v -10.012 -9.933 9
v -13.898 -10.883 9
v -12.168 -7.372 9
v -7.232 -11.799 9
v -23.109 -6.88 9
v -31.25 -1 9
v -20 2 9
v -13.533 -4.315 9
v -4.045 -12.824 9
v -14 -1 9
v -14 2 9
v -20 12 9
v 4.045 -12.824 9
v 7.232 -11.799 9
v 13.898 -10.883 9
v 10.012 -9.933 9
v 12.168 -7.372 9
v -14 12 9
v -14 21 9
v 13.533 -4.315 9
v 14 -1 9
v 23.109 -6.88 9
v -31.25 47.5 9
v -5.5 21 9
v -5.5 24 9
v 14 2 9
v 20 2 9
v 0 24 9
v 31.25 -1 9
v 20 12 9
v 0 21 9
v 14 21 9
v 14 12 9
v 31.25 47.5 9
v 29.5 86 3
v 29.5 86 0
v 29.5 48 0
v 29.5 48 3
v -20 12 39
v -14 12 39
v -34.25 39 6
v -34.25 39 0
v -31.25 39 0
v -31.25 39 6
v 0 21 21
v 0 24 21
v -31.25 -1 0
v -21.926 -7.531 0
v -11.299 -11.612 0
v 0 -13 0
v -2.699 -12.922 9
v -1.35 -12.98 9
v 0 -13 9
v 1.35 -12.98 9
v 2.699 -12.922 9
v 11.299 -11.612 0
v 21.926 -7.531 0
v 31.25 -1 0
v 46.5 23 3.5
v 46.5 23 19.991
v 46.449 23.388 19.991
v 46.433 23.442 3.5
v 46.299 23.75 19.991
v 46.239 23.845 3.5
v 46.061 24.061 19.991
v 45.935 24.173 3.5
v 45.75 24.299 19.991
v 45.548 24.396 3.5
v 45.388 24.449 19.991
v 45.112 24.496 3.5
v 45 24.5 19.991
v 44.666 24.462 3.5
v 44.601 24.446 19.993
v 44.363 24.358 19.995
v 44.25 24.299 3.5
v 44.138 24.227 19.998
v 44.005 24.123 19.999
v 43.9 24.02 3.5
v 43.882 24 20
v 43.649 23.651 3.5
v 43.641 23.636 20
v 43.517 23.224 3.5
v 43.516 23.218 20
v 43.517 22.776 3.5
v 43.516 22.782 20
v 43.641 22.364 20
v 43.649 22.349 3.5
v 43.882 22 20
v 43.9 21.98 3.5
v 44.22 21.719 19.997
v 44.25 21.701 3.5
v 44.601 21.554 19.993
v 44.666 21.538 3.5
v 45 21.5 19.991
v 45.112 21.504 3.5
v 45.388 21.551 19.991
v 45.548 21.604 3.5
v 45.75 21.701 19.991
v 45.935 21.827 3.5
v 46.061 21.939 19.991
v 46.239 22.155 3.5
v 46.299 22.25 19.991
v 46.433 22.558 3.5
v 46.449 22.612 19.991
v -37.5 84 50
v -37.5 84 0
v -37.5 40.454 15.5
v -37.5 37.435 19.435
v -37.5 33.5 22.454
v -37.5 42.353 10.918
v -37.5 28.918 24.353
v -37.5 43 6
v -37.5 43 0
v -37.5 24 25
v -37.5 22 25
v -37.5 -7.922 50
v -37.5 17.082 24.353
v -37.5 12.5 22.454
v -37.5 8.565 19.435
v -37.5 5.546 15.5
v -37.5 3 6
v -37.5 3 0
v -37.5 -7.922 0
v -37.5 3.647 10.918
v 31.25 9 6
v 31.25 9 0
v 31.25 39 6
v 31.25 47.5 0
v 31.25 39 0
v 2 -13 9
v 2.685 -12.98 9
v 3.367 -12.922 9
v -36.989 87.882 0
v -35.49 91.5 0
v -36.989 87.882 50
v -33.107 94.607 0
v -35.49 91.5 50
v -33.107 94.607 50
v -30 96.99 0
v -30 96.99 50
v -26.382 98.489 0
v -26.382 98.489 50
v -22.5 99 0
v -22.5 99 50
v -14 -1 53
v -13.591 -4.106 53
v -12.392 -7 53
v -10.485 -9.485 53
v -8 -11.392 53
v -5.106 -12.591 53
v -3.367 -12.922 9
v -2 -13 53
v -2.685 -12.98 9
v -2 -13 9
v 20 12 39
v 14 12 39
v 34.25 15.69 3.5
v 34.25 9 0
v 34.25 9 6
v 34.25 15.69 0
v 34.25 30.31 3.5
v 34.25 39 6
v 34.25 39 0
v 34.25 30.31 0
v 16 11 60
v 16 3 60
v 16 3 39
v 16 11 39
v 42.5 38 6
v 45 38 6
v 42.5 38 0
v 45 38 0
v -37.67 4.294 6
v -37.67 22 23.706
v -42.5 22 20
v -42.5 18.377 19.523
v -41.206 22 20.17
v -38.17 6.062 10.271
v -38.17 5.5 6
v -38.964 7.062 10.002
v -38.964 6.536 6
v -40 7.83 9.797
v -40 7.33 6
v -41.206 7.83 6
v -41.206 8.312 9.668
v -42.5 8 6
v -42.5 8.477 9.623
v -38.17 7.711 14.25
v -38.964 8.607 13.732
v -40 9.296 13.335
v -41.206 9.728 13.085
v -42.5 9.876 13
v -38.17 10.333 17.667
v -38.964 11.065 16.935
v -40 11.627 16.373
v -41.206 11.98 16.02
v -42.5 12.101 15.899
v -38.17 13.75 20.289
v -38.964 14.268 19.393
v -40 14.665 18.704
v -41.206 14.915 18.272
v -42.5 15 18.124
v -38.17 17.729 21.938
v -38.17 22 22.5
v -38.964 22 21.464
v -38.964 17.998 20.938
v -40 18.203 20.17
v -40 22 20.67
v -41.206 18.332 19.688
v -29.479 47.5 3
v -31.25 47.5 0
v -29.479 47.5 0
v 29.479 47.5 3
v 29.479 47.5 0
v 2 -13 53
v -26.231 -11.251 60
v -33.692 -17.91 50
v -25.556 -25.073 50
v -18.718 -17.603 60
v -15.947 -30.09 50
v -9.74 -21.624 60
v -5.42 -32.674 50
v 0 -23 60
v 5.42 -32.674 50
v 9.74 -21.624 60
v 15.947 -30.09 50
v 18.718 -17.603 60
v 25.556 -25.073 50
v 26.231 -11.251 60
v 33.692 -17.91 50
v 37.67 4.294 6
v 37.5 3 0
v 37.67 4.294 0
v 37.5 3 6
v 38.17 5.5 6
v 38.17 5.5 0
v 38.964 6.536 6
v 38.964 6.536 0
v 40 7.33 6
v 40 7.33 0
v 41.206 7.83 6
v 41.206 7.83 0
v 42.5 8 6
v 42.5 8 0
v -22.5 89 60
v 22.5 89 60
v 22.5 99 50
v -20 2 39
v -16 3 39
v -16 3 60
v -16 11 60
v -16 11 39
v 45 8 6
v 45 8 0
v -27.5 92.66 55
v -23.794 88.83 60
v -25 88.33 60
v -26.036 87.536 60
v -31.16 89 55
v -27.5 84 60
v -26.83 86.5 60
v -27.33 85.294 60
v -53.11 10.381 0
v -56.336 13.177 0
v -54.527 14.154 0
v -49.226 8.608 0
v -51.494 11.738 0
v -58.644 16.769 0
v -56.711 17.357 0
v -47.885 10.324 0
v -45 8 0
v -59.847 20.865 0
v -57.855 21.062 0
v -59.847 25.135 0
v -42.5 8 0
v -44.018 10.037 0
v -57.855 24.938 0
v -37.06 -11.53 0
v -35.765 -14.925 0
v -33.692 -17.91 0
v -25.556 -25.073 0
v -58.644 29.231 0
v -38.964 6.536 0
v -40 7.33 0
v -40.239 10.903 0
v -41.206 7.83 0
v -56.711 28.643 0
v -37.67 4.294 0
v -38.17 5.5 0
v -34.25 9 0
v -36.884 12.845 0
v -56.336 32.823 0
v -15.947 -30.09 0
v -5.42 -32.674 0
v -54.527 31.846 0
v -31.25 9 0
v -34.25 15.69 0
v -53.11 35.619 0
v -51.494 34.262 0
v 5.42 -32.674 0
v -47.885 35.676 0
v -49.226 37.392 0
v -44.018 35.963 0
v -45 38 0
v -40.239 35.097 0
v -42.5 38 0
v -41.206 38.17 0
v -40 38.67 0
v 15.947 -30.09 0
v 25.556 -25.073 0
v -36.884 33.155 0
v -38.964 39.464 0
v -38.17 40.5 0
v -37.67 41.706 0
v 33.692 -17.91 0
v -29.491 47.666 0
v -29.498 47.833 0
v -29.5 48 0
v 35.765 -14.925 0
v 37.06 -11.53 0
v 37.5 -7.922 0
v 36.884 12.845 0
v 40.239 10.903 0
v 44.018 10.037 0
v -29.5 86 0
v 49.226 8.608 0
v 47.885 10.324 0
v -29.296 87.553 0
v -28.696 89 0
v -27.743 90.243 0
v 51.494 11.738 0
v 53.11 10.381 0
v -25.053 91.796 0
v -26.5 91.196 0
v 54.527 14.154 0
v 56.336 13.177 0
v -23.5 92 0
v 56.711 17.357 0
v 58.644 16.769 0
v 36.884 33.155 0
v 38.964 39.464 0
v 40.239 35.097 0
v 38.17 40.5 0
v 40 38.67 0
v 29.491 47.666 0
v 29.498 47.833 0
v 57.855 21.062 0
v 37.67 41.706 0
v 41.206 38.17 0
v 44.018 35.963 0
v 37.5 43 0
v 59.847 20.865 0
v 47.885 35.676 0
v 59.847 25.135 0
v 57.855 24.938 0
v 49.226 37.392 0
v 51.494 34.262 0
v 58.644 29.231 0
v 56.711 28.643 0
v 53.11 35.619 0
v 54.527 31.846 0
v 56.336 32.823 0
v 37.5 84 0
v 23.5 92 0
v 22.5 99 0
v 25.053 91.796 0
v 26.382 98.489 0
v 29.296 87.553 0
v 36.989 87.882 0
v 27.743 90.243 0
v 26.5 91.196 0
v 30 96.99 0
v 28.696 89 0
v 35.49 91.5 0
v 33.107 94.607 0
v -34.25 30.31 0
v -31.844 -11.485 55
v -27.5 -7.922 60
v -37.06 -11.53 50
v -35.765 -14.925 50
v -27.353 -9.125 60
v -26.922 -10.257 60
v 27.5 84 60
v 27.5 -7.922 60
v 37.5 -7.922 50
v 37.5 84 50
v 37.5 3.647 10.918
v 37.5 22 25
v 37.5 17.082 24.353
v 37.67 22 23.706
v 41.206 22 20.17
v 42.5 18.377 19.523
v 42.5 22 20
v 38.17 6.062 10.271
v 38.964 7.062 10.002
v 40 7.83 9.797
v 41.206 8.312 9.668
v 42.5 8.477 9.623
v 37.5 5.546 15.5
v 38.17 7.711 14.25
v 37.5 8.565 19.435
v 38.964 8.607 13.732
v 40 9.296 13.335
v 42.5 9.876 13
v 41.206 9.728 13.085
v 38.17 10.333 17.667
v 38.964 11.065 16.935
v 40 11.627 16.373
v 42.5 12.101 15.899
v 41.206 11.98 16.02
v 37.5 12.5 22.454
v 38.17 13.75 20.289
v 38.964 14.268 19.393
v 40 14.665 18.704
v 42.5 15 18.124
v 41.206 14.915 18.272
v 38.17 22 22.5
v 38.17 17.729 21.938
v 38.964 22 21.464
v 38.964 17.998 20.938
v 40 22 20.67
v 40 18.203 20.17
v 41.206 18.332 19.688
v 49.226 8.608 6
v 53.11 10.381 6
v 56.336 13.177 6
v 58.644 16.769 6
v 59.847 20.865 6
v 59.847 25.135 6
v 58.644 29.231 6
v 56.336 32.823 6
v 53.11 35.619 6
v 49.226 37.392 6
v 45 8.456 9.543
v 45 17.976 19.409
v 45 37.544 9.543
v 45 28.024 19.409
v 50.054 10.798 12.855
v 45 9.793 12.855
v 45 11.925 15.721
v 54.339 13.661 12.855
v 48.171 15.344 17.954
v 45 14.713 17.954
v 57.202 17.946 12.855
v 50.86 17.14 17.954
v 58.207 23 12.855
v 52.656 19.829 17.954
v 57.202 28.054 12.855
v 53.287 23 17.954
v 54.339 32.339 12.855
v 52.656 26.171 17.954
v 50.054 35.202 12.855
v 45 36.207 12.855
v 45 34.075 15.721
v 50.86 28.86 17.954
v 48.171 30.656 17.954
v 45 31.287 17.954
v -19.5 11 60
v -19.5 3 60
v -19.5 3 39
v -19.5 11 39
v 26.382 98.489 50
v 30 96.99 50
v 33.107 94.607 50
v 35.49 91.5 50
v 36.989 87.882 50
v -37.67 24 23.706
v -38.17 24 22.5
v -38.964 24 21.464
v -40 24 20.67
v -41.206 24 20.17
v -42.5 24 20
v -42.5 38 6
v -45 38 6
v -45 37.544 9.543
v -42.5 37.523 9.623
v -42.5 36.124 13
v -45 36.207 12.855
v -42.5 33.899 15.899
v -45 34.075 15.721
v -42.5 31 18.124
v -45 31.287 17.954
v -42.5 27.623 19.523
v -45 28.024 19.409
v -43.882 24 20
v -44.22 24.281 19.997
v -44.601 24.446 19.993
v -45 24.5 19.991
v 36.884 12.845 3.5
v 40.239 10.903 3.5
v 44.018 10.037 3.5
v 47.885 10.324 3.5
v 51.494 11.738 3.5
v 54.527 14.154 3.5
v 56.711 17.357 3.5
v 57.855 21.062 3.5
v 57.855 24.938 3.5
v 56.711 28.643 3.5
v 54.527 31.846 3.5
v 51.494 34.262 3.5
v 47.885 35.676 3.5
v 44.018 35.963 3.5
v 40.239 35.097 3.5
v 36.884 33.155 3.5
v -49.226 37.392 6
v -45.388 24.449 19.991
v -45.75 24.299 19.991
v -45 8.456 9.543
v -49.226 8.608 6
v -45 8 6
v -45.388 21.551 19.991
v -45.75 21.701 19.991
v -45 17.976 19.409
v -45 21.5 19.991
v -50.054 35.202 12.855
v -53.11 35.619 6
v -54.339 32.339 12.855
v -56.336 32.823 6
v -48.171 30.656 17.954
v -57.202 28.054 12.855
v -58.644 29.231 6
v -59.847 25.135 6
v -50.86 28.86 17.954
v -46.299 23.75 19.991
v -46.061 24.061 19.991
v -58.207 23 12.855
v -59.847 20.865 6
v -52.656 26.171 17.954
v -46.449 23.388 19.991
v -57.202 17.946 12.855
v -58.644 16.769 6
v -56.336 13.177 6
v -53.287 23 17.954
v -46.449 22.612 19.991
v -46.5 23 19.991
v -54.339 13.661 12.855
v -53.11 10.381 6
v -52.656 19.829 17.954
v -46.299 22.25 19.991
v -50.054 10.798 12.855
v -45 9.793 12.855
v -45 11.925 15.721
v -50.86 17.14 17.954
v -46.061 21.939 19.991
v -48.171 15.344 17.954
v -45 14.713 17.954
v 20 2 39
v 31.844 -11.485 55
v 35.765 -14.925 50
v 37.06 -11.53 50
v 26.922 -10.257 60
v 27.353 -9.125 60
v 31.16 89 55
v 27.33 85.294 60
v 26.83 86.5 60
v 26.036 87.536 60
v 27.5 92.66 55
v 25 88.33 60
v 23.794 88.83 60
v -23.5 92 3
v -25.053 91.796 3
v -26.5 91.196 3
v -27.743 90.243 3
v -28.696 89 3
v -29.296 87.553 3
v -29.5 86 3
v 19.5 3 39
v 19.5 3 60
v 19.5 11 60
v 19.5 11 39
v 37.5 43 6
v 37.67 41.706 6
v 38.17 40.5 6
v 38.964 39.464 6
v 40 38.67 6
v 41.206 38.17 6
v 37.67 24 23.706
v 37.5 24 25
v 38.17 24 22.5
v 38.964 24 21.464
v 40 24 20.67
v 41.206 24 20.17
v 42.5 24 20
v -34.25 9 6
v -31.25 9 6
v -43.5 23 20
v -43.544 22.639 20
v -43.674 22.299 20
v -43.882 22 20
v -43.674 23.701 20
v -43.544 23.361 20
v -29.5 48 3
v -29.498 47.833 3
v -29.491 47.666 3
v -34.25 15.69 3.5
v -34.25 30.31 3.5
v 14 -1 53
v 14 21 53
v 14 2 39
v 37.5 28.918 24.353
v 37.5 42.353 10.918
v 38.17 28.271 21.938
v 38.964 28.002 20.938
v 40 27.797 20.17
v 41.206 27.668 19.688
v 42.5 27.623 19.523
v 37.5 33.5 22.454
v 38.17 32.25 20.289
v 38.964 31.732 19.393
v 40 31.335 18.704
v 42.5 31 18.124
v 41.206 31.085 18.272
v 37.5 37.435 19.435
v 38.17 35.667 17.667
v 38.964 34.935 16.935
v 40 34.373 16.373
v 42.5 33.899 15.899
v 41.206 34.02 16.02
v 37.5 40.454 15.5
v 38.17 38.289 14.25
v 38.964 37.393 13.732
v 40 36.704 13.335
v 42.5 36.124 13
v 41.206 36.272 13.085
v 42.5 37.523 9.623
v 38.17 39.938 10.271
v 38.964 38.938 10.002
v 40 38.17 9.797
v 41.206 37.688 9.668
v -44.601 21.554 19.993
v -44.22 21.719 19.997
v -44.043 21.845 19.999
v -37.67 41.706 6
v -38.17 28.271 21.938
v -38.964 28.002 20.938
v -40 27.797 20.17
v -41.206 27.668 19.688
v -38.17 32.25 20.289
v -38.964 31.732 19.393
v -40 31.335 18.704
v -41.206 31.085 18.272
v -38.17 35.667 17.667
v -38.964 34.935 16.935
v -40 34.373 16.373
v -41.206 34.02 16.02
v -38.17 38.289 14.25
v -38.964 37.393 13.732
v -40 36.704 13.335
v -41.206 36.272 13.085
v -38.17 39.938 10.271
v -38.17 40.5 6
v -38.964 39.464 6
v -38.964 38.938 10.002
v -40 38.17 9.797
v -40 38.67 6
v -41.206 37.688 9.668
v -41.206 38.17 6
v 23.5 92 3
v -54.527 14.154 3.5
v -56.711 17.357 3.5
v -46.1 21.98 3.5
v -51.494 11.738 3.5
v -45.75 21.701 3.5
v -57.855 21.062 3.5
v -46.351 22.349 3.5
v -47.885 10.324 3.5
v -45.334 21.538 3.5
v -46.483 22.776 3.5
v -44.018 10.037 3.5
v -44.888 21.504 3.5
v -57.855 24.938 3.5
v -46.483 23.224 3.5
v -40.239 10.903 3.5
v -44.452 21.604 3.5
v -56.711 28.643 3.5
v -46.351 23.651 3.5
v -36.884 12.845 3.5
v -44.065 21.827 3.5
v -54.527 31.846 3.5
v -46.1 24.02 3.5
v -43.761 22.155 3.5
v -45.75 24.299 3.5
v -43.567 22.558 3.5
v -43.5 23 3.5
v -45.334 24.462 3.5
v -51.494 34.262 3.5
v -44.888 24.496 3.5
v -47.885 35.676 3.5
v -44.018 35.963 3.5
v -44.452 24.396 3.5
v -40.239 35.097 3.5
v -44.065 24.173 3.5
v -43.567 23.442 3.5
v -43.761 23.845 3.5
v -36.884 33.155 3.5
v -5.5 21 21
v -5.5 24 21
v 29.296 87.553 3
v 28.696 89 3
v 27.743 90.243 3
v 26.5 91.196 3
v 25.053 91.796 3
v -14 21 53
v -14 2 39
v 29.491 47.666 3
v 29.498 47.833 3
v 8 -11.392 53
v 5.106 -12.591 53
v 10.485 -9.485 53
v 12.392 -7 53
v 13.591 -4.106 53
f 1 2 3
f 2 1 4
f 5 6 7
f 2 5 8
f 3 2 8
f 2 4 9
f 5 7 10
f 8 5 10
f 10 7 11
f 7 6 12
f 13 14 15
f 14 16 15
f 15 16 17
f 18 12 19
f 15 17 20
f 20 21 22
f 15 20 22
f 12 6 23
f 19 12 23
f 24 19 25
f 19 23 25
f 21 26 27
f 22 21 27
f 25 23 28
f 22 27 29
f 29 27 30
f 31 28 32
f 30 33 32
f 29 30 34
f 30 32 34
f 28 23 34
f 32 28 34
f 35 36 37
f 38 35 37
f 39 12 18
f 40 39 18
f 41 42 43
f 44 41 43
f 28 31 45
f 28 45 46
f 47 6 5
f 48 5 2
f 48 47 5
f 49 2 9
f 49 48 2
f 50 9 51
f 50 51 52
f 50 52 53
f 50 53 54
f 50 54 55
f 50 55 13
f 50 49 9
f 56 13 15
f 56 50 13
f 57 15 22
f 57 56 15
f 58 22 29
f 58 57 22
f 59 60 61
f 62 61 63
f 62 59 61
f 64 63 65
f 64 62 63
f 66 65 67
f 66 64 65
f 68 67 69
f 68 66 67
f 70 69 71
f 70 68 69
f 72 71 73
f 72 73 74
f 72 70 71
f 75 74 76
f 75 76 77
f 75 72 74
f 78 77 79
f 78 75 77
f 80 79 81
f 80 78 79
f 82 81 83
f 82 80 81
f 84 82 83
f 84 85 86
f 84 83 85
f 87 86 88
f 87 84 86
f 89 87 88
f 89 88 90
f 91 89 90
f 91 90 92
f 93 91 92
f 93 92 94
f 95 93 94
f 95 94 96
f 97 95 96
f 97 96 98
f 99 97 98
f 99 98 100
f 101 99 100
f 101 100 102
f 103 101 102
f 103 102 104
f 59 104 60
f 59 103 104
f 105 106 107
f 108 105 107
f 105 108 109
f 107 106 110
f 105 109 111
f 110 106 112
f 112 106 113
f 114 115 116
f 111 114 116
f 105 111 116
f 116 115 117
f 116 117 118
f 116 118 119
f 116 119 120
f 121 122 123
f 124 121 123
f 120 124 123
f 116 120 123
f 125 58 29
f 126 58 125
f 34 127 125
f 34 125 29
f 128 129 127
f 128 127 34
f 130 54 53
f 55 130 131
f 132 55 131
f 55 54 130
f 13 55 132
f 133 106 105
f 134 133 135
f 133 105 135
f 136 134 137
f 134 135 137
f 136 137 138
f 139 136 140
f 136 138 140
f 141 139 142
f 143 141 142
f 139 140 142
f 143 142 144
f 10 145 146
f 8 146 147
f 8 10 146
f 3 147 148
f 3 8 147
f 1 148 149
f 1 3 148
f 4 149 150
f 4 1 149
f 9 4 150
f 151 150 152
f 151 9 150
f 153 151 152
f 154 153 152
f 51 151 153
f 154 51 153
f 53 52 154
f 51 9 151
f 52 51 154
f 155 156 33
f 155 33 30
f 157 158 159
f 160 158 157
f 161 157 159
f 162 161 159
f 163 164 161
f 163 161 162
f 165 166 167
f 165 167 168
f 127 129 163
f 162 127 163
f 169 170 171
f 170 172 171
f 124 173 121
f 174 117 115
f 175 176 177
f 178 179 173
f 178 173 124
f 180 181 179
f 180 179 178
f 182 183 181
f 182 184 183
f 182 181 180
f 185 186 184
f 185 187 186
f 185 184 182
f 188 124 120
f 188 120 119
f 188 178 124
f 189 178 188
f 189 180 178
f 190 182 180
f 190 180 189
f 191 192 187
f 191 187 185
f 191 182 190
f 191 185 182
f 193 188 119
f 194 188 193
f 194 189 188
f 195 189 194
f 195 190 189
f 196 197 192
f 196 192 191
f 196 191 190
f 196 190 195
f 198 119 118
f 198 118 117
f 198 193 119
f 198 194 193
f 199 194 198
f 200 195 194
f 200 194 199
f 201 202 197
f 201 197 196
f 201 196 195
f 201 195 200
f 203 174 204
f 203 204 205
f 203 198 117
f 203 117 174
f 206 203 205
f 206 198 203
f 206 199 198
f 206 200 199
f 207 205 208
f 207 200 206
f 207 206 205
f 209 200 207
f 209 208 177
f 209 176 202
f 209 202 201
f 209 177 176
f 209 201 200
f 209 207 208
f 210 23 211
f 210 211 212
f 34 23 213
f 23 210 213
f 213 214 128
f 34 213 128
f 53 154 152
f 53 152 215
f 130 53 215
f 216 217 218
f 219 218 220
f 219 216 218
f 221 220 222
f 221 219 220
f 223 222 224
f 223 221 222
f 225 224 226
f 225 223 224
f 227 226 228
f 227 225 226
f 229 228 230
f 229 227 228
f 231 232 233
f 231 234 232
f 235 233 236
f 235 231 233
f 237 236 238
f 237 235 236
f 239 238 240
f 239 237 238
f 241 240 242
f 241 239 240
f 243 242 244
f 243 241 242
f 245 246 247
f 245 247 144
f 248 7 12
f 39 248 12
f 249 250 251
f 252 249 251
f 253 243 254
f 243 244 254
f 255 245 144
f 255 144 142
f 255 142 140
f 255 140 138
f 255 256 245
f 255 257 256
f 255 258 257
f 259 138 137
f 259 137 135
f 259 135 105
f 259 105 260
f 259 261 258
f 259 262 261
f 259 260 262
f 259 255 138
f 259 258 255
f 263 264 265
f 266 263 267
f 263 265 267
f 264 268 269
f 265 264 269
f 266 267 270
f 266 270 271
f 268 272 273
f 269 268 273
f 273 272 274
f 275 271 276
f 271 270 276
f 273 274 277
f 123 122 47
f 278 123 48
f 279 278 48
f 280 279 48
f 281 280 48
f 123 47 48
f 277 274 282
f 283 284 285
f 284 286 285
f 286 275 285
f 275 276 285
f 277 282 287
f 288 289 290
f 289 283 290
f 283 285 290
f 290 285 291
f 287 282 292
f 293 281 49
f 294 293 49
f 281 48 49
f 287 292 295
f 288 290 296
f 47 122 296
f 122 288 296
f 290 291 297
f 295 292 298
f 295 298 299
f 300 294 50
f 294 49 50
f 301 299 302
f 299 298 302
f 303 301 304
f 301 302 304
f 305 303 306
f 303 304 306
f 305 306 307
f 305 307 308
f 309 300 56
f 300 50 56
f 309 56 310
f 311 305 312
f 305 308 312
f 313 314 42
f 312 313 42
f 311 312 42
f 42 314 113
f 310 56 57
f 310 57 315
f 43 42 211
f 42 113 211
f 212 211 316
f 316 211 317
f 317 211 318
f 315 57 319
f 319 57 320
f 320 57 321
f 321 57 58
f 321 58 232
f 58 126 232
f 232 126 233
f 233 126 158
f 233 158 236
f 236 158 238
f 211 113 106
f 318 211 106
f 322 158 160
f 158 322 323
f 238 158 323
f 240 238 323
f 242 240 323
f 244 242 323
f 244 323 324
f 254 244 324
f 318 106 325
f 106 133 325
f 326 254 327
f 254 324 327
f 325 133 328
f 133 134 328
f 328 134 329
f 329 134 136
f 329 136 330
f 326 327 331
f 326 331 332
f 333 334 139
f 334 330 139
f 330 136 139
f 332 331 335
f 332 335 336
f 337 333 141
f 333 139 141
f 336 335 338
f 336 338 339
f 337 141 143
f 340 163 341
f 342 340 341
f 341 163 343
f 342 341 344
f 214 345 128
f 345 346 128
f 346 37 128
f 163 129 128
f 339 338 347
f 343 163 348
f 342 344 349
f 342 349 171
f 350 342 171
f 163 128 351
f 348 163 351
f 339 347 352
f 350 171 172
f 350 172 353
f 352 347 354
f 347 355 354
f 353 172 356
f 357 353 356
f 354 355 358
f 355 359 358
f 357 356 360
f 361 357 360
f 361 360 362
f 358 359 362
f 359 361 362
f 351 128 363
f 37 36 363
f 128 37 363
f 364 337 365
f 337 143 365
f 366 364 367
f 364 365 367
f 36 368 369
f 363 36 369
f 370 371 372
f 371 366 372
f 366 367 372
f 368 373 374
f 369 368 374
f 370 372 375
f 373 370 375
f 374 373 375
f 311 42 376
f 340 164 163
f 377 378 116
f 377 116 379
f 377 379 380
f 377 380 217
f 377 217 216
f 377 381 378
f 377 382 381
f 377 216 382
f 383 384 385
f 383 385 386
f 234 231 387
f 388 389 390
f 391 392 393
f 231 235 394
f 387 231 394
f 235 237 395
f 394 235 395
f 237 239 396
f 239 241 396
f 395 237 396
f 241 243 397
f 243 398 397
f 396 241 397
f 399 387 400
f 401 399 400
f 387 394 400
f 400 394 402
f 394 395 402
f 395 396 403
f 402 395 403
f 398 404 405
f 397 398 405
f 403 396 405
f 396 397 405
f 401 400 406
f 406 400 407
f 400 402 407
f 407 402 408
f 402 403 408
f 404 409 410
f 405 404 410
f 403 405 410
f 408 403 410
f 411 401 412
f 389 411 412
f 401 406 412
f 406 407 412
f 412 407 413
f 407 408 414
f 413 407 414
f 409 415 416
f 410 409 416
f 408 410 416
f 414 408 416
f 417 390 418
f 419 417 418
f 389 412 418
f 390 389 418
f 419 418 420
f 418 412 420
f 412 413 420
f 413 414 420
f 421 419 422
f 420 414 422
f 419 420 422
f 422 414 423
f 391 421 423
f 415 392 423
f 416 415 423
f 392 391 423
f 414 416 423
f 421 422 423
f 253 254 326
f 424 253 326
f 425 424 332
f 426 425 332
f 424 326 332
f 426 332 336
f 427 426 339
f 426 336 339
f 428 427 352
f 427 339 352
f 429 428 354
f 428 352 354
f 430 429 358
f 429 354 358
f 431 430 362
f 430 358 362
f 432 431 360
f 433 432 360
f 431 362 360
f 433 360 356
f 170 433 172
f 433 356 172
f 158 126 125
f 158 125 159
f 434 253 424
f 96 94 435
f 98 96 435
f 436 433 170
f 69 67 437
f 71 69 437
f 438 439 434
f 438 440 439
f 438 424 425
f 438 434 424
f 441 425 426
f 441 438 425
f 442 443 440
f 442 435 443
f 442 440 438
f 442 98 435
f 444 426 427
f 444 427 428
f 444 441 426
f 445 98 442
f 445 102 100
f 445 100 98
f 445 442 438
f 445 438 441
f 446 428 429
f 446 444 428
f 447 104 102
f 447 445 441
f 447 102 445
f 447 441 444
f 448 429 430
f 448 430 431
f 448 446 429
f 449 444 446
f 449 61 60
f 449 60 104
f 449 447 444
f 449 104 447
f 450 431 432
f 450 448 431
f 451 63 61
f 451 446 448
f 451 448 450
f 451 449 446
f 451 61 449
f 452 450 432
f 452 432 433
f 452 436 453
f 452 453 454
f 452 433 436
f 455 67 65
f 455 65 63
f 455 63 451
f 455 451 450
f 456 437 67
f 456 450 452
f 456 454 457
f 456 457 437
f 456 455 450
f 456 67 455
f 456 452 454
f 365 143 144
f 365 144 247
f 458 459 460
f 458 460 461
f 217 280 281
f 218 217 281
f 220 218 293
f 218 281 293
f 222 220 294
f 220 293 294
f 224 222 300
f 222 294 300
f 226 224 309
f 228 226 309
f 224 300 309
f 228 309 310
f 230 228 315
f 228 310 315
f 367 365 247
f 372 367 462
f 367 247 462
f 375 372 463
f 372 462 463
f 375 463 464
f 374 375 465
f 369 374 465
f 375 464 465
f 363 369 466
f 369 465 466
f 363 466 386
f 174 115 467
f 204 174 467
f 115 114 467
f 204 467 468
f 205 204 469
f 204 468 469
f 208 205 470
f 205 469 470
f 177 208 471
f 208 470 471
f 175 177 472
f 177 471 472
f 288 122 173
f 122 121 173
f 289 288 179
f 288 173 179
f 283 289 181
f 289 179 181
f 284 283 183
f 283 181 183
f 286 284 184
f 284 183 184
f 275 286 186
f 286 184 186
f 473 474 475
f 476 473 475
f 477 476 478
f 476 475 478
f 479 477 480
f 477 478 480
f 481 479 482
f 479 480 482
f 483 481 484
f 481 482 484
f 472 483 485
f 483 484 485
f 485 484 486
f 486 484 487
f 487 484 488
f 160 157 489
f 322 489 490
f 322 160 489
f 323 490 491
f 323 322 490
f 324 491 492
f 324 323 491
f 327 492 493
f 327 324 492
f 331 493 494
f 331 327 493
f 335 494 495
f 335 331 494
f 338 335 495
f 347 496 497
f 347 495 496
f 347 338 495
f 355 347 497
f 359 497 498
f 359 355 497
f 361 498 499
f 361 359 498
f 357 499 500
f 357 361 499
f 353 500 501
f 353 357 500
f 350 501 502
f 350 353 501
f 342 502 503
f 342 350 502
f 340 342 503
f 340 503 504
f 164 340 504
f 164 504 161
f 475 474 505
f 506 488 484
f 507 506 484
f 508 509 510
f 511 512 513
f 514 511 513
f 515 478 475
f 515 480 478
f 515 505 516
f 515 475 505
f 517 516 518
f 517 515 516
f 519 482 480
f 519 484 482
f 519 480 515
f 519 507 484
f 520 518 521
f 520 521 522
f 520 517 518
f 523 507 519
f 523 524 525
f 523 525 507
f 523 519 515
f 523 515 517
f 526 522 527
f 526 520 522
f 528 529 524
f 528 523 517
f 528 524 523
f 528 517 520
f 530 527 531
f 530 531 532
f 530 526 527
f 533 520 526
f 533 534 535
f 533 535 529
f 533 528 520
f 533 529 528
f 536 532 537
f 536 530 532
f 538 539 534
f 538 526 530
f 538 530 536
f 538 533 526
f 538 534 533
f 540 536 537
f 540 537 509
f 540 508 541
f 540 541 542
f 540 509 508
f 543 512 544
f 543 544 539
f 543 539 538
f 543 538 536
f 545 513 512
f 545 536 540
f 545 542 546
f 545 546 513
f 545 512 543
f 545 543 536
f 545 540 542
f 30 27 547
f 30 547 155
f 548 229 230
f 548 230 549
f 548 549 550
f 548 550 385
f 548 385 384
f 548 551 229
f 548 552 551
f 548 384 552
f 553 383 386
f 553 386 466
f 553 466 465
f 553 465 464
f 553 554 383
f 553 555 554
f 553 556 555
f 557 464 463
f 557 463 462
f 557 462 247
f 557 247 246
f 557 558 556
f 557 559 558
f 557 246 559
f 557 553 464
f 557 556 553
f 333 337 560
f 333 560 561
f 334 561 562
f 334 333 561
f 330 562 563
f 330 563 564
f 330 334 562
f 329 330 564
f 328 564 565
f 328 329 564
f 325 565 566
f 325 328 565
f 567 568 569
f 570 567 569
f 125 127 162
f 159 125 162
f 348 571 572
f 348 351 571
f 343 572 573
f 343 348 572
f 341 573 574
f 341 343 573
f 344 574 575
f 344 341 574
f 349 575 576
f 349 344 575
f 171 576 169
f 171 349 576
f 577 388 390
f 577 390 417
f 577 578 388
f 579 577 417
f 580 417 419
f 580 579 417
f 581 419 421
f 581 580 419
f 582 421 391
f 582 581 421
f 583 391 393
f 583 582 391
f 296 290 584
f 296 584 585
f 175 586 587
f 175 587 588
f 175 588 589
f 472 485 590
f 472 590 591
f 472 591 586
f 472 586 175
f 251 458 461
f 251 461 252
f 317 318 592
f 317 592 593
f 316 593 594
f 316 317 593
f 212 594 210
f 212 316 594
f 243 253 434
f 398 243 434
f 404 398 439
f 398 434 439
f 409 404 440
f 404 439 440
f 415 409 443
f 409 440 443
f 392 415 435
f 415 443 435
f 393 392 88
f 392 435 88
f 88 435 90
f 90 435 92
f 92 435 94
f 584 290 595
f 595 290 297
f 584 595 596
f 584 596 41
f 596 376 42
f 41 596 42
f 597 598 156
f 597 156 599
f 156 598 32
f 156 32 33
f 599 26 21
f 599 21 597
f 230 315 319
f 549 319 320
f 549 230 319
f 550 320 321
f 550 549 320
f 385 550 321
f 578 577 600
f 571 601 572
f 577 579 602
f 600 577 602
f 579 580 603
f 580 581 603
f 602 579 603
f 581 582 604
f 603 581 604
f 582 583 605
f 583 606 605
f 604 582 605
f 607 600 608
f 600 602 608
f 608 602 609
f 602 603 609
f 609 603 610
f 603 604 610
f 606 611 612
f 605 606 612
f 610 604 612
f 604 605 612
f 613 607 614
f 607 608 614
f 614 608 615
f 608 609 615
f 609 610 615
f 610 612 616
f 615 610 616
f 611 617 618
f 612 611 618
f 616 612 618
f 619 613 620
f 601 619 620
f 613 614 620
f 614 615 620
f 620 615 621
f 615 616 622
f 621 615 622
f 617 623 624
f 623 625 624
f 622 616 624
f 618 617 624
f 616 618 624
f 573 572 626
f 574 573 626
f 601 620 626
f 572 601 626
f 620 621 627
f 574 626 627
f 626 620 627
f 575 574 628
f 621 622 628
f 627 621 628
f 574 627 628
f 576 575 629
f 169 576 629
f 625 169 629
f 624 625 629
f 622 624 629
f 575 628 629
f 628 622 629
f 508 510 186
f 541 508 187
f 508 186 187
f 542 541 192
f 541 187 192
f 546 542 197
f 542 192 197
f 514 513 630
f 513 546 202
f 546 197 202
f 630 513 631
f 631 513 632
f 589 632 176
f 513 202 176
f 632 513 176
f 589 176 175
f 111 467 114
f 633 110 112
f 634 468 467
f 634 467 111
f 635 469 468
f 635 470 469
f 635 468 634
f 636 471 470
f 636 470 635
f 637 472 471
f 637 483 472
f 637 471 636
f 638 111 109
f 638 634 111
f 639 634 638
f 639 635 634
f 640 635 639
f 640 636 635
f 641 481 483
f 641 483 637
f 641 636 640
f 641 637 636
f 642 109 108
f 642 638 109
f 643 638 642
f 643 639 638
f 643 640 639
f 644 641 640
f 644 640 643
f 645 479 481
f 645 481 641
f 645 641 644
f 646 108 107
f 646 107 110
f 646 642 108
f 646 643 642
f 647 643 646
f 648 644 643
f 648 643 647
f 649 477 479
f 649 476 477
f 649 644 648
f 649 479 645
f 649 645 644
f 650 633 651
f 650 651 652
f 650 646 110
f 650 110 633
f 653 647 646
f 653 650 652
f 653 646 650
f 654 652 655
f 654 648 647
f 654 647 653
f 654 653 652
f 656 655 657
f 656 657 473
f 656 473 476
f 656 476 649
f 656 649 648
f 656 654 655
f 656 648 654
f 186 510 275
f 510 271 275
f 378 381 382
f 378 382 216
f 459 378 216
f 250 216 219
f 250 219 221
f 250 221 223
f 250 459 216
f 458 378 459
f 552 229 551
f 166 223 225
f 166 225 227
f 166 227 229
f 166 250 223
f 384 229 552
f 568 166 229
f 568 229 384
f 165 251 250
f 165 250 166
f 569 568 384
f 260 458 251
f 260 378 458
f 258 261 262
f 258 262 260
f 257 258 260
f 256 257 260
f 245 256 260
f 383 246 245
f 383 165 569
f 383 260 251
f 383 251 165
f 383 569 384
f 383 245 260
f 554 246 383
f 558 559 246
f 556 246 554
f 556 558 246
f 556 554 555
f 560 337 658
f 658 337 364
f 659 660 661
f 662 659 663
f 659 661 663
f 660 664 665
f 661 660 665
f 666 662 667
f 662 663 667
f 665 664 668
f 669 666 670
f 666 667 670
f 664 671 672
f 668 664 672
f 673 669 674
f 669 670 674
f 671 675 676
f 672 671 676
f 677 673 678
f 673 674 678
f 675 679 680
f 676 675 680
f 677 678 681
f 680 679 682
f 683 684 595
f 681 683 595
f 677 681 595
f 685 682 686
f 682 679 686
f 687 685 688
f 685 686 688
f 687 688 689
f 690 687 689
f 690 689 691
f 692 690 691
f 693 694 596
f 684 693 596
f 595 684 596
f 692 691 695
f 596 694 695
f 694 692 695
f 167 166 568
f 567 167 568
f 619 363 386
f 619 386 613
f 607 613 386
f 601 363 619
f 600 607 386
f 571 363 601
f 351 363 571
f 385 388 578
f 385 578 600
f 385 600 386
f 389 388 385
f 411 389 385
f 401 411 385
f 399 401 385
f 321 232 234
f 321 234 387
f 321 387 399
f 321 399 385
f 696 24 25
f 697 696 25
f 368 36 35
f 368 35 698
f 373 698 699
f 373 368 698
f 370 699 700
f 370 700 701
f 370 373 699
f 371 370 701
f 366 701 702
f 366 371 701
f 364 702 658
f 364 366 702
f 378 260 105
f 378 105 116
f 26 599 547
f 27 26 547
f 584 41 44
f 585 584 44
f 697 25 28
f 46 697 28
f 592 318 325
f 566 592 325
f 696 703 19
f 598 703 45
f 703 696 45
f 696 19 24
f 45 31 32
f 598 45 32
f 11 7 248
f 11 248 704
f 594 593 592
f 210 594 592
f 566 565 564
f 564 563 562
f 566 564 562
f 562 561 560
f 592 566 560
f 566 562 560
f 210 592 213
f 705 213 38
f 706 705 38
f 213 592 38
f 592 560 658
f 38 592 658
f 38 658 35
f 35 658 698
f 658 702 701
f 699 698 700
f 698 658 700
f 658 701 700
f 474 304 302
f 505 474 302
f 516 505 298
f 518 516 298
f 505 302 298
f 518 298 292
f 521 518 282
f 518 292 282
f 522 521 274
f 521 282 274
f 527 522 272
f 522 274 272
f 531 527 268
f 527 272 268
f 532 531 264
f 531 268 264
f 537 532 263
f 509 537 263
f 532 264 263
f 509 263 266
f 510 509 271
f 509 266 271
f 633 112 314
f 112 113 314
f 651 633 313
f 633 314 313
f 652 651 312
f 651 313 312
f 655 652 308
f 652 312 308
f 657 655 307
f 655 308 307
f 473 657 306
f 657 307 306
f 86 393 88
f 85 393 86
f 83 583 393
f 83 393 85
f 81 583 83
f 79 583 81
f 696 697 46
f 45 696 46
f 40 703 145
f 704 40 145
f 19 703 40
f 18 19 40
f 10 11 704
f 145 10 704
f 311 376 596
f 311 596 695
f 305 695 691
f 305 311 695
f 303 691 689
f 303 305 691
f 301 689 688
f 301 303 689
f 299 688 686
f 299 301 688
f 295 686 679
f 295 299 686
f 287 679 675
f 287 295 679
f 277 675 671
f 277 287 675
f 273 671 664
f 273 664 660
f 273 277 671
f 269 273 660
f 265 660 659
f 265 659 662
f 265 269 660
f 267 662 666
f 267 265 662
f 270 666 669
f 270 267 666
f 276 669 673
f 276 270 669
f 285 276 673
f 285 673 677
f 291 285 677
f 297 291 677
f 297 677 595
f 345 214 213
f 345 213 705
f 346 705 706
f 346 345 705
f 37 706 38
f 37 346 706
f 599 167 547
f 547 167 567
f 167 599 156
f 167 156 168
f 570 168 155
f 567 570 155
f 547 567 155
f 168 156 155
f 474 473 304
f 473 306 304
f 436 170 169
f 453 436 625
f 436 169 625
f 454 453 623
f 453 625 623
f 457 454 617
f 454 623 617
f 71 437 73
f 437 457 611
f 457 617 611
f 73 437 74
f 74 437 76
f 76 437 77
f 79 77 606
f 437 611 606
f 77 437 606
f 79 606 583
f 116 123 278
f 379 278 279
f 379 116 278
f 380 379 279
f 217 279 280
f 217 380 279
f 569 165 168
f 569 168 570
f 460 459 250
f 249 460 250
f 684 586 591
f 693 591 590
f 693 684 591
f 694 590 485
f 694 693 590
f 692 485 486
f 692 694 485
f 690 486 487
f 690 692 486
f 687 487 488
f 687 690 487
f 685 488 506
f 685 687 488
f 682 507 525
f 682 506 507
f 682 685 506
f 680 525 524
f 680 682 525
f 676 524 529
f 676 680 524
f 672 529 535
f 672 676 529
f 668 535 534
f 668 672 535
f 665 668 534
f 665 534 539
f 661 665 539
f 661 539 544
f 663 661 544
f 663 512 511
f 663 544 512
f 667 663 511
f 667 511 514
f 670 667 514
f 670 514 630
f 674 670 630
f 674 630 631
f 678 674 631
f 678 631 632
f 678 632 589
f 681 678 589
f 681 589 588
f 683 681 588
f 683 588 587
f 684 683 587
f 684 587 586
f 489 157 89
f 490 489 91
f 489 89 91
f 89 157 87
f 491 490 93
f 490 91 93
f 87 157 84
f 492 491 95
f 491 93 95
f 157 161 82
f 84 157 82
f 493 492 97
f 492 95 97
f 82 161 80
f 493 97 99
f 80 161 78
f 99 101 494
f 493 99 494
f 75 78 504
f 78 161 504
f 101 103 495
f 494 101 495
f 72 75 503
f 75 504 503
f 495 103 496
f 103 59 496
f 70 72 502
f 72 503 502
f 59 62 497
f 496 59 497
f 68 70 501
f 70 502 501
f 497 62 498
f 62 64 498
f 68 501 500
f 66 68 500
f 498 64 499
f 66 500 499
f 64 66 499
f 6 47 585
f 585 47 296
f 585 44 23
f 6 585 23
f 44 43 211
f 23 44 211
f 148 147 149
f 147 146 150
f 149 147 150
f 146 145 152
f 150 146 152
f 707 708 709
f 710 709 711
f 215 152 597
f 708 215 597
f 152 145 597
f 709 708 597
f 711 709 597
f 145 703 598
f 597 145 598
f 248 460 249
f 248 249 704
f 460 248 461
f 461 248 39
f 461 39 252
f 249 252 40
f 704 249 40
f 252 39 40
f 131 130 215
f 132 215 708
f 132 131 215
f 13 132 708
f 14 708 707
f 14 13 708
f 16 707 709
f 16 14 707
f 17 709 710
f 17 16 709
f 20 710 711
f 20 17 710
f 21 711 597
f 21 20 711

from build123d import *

# Parameters (mm, degrees)
SKETCH007_R      = 1.5
EXTRUDE012_DEPTH = 75
SKETCH008_R      = 13
EXTRUDE014_DEPTH = 3.5
EXTRUDE002_DEPTH = 44
SKETCH002_W      = 3.5
SKETCH002_H      = 8
EXTRUDE003_DEPTH = 75
SKETCH003_W      = 40
SKETCH003_H      = 10
EXTRUDE005_DEPTH = 30
SKETCH004_W      = 68.5
SKETCH004_H      = 30
EXTRUDE006_DEPTH = 6
SKETCH005_W      = 5.5
SKETCH005_H      = 24
EXTRUDE008_DEPTH = 12
EXTRUDE009_DEPTH = 3
EXTRUDE010_DEPTH = 3
EXTRUDE_DEPTH    = 9
EXTRUDE017_DEPTH = 20
EXTRUDE015_DEPTH = 60
FILLET_R         = 15
FILLET001_R      = 14
FILLET002_R      = 5
CHAMFER_SIZE     = 10


with BuildPart() as extrude012:
    # Sketch007 → Extrude012 (new body)
    with BuildSketch(Plane.XY):
        with Locations((-45, 23)):
            Circle(SKETCH007_R)
        with Locations((45, 23)):
            Circle(SKETCH007_R)
    extrude(amount=EXTRUDE012_DEPTH)


with BuildPart() as extrude014:
    # Sketch008 → Extrude014 (new body)
    with BuildSketch(Plane.XY):
        with Locations((-45, 23)):
            Circle(SKETCH008_R)
        with Locations((45, 23)):
            Circle(SKETCH008_R)
    extrude(amount=EXTRUDE014_DEPTH)


with BuildPart() as extrude002:
    # Sketch001 (on Face6 of Extrude) → Extrude002 (new body)
    with BuildSketch(Plane.XY.offset(9)):
        with BuildLine():
            Line((-14, 21), (-14, -1))
            ThreePointArc((-14, -1), (-10.485281, -9.485281), (-2, -13))
            Line((-2, -13), (2, -13))
            ThreePointArc((2, -13), (10.485281, -9.485281), (14, -1))
            Line((14, 21), (14, -1))
            Line((-14, 21), (14, 21))
        make_face()
    extrude(amount=EXTRUDE002_DEPTH)


with BuildPart() as extrude003:
    # Sketch002 (on Face6 of Extrude) → Extrude003 (new body)
    with BuildSketch(Plane.XY.offset(9)):
        with Locations((-17.75, 7)):
            Rectangle(SKETCH002_W, SKETCH002_H)
        with Locations((17.75, 7)):
            Rectangle(SKETCH002_W, SKETCH002_H)
    extrude(amount=EXTRUDE003_DEPTH)


with BuildPart() as extrude005:
    # Sketch003 (on Face6 of Extrude) → Extrude005 (new body)
    with BuildSketch(Plane.XY.offset(9)):
        with Locations((0, 7)):
            Rectangle(SKETCH003_W, SKETCH003_H)
    extrude(amount=EXTRUDE005_DEPTH)


with BuildPart() as extrude006:
    # Sketch004 → Extrude006 (new body)
    with BuildSketch(Plane.XY):
        with Locations((0, 24)):
            Rectangle(SKETCH004_W, SKETCH004_H)
    extrude(amount=EXTRUDE006_DEPTH)


with BuildPart() as extrude008:
    # Sketch005 (on Face6 of Extrude) → Extrude008 (new body)
    with BuildSketch(Plane.XY.offset(9)):
        with Locations((-2.75, 12)):
            Rectangle(SKETCH005_W, SKETCH005_H)
    extrude(amount=EXTRUDE008_DEPTH)


with BuildPart() as extrude009:
    # Sketch006 → Extrude009 (new body)
    with BuildSketch(Plane.XY):
        with BuildLine():
            ThreePointArc((-23.5, 92), (-27.742641, 90.242641), (-29.5, 86))
            Line((-29.5, 48), (-29.5, 86))
            ThreePointArc((-29.5, 48), (-27.742641, 43.757359), (-23.5, 42))
            Line((23.5, 42), (-23.5, 42))
            ThreePointArc((23.5, 42), (27.742641, 43.757359), (29.5, 48))
            Line((29.5, 86), (29.5, 48))
            ThreePointArc((29.5, 86), (27.742641, 90.242641), (23.5, 92))
            Line((-23.5, 92), (23.5, 92))
        make_face()
    extrude(amount=EXTRUDE009_DEPTH)


with BuildPart() as extrude010:
    # Sketch006 → Extrude010 (new body)
    with BuildSketch(Plane.XY):
        with BuildLine():
            ThreePointArc((-23.5, 92), (-27.742641, 90.242641), (-29.5, 86))
            Line((-29.5, 48), (-29.5, 86))
            ThreePointArc((-29.5, 48), (-27.742641, 43.757359), (-23.5, 42))
            Line((23.5, 42), (-23.5, 42))
            ThreePointArc((23.5, 42), (27.742641, 43.757359), (29.5, 48))
            Line((29.5, 86), (29.5, 48))
            ThreePointArc((29.5, 86), (27.742641, 90.242641), (23.5, 92))
            Line((-23.5, 92), (23.5, 92))
        make_face()
    extrude(amount=EXTRUDE010_DEPTH)


with BuildPart() as fusion001:
    # Sketch → Extrude (new body)
    with BuildSketch(Plane.XY):
        with BuildLine():
            ThreePointArc((-31.25, -1), (0, -13), (31.25, -1))
            Line((31.25, -1), (31.25, 47.5))
            Line((-31.25, 47.5), (31.25, 47.5))
            Line((-31.25, -1), (-31.25, 47.5))
        make_face()
    extrude(amount=EXTRUDE_DEPTH)

    # Fusion: union Extrude002, Extrude003, Extrude005, Extrude006, Extrude008, Extrude009, Extrude010
    add(extrude002.part)
    add(extrude003.part)
    add(extrude005.part)
    add(extrude006.part)
    add(extrude008.part)
    add(extrude009.part)
    add(extrude010.part)

    # Fusion001: union Extrude012, Extrude014
    add(extrude012.part)
    add(extrude014.part)


with BuildPart() as extrude017:
    # Sketch010 → Extrude017 (new body)
    with BuildSketch(Plane.XY):
        with BuildLine():
            ThreePointArc((-45, 38), (-60, 23), (-45, 8))
            Line((-45, 8), (45, 8))
            ThreePointArc((45, 8), (60, 23), (45, 38))
            Line((45, 38), (-45, 38))
        make_face()
    extrude(amount=EXTRUDE017_DEPTH)


with BuildPart() as cut:
    # Sketch009 → Extrude015 (new body)
    with BuildSketch(Plane.XY):
        with BuildLine():
            Line((-37.5, 99), (-37.5, -13))
            ThreePointArc((-37.5, -13), (0, -33), (37.5, -13))
            Line((37.5, 99), (37.5, -13))
            Line((-37.5, 99), (37.5, 99))
        make_face()
    extrude(amount=EXTRUDE015_DEPTH)

    # Fusion002: union Extrude017
    add(extrude017.part)

    # Fillet
    fillet_edges = [cut.edges().sort_by_distance(p)[0] for p in [
        (-37.5, -13, 30),
        (-37.5, 99, 30),
        (37.5, -13, 30),
        (37.5, 99, 30),
    ]]
    fillet(fillet_edges, radius=FILLET_R)

    # Fillet001
    fillet001_edges = [cut.edges().sort_by_distance(p)[0] for p in [
        (-41.25, 38, 20),
        (-41.25, 8, 20),
        (-60, 23, 20),
        (41.25, 38, 20),
        (60, 23, 20),
        (41.25, 8, 20),
    ]]
    fillet(fillet001_edges, radius=FILLET001_R)

    # Fillet002
    fillet002_edges = [cut.edges().sort_by_distance(p)[0] for p in [
        (-37.5, 8, 3),
        (-37.5, 12.100505, 15.899495),
        (-37.5, 23, 20),
        (-37.5, 33.899495, 15.899495),
        (-37.5, 38, 3),
        (37.5, 8, 3),
        (37.5, 12.100505, 15.899495),
        (37.5, 23, 20),
        (37.5, 33.899495, 15.899495),
        (37.5, 38, 3),
    ]]
    fillet(fillet002_edges, radius=FILLET002_R)

    # Chamfer
    chamfer_edges = [cut.edges().sort_by_distance(p)[0] for p in [
        (-37.5, 38.038835, 60),
        (-33.106602, 94.606602, 60),
        (-36.515628, -13.26669, 60),
        (0, -33, 60),
        (36.515628, -13.26669, 60),
        (37.5, 38.038835, 60),
        (33.106602, 94.606602, 60),
        (0, 99, 60),
    ]]
    chamfer(chamfer_edges, length=CHAMFER_SIZE)

    # Cut: cut Fusion001
    add(fusion001.part, mode=Mode.SUBTRACT)


solid = cut.part
